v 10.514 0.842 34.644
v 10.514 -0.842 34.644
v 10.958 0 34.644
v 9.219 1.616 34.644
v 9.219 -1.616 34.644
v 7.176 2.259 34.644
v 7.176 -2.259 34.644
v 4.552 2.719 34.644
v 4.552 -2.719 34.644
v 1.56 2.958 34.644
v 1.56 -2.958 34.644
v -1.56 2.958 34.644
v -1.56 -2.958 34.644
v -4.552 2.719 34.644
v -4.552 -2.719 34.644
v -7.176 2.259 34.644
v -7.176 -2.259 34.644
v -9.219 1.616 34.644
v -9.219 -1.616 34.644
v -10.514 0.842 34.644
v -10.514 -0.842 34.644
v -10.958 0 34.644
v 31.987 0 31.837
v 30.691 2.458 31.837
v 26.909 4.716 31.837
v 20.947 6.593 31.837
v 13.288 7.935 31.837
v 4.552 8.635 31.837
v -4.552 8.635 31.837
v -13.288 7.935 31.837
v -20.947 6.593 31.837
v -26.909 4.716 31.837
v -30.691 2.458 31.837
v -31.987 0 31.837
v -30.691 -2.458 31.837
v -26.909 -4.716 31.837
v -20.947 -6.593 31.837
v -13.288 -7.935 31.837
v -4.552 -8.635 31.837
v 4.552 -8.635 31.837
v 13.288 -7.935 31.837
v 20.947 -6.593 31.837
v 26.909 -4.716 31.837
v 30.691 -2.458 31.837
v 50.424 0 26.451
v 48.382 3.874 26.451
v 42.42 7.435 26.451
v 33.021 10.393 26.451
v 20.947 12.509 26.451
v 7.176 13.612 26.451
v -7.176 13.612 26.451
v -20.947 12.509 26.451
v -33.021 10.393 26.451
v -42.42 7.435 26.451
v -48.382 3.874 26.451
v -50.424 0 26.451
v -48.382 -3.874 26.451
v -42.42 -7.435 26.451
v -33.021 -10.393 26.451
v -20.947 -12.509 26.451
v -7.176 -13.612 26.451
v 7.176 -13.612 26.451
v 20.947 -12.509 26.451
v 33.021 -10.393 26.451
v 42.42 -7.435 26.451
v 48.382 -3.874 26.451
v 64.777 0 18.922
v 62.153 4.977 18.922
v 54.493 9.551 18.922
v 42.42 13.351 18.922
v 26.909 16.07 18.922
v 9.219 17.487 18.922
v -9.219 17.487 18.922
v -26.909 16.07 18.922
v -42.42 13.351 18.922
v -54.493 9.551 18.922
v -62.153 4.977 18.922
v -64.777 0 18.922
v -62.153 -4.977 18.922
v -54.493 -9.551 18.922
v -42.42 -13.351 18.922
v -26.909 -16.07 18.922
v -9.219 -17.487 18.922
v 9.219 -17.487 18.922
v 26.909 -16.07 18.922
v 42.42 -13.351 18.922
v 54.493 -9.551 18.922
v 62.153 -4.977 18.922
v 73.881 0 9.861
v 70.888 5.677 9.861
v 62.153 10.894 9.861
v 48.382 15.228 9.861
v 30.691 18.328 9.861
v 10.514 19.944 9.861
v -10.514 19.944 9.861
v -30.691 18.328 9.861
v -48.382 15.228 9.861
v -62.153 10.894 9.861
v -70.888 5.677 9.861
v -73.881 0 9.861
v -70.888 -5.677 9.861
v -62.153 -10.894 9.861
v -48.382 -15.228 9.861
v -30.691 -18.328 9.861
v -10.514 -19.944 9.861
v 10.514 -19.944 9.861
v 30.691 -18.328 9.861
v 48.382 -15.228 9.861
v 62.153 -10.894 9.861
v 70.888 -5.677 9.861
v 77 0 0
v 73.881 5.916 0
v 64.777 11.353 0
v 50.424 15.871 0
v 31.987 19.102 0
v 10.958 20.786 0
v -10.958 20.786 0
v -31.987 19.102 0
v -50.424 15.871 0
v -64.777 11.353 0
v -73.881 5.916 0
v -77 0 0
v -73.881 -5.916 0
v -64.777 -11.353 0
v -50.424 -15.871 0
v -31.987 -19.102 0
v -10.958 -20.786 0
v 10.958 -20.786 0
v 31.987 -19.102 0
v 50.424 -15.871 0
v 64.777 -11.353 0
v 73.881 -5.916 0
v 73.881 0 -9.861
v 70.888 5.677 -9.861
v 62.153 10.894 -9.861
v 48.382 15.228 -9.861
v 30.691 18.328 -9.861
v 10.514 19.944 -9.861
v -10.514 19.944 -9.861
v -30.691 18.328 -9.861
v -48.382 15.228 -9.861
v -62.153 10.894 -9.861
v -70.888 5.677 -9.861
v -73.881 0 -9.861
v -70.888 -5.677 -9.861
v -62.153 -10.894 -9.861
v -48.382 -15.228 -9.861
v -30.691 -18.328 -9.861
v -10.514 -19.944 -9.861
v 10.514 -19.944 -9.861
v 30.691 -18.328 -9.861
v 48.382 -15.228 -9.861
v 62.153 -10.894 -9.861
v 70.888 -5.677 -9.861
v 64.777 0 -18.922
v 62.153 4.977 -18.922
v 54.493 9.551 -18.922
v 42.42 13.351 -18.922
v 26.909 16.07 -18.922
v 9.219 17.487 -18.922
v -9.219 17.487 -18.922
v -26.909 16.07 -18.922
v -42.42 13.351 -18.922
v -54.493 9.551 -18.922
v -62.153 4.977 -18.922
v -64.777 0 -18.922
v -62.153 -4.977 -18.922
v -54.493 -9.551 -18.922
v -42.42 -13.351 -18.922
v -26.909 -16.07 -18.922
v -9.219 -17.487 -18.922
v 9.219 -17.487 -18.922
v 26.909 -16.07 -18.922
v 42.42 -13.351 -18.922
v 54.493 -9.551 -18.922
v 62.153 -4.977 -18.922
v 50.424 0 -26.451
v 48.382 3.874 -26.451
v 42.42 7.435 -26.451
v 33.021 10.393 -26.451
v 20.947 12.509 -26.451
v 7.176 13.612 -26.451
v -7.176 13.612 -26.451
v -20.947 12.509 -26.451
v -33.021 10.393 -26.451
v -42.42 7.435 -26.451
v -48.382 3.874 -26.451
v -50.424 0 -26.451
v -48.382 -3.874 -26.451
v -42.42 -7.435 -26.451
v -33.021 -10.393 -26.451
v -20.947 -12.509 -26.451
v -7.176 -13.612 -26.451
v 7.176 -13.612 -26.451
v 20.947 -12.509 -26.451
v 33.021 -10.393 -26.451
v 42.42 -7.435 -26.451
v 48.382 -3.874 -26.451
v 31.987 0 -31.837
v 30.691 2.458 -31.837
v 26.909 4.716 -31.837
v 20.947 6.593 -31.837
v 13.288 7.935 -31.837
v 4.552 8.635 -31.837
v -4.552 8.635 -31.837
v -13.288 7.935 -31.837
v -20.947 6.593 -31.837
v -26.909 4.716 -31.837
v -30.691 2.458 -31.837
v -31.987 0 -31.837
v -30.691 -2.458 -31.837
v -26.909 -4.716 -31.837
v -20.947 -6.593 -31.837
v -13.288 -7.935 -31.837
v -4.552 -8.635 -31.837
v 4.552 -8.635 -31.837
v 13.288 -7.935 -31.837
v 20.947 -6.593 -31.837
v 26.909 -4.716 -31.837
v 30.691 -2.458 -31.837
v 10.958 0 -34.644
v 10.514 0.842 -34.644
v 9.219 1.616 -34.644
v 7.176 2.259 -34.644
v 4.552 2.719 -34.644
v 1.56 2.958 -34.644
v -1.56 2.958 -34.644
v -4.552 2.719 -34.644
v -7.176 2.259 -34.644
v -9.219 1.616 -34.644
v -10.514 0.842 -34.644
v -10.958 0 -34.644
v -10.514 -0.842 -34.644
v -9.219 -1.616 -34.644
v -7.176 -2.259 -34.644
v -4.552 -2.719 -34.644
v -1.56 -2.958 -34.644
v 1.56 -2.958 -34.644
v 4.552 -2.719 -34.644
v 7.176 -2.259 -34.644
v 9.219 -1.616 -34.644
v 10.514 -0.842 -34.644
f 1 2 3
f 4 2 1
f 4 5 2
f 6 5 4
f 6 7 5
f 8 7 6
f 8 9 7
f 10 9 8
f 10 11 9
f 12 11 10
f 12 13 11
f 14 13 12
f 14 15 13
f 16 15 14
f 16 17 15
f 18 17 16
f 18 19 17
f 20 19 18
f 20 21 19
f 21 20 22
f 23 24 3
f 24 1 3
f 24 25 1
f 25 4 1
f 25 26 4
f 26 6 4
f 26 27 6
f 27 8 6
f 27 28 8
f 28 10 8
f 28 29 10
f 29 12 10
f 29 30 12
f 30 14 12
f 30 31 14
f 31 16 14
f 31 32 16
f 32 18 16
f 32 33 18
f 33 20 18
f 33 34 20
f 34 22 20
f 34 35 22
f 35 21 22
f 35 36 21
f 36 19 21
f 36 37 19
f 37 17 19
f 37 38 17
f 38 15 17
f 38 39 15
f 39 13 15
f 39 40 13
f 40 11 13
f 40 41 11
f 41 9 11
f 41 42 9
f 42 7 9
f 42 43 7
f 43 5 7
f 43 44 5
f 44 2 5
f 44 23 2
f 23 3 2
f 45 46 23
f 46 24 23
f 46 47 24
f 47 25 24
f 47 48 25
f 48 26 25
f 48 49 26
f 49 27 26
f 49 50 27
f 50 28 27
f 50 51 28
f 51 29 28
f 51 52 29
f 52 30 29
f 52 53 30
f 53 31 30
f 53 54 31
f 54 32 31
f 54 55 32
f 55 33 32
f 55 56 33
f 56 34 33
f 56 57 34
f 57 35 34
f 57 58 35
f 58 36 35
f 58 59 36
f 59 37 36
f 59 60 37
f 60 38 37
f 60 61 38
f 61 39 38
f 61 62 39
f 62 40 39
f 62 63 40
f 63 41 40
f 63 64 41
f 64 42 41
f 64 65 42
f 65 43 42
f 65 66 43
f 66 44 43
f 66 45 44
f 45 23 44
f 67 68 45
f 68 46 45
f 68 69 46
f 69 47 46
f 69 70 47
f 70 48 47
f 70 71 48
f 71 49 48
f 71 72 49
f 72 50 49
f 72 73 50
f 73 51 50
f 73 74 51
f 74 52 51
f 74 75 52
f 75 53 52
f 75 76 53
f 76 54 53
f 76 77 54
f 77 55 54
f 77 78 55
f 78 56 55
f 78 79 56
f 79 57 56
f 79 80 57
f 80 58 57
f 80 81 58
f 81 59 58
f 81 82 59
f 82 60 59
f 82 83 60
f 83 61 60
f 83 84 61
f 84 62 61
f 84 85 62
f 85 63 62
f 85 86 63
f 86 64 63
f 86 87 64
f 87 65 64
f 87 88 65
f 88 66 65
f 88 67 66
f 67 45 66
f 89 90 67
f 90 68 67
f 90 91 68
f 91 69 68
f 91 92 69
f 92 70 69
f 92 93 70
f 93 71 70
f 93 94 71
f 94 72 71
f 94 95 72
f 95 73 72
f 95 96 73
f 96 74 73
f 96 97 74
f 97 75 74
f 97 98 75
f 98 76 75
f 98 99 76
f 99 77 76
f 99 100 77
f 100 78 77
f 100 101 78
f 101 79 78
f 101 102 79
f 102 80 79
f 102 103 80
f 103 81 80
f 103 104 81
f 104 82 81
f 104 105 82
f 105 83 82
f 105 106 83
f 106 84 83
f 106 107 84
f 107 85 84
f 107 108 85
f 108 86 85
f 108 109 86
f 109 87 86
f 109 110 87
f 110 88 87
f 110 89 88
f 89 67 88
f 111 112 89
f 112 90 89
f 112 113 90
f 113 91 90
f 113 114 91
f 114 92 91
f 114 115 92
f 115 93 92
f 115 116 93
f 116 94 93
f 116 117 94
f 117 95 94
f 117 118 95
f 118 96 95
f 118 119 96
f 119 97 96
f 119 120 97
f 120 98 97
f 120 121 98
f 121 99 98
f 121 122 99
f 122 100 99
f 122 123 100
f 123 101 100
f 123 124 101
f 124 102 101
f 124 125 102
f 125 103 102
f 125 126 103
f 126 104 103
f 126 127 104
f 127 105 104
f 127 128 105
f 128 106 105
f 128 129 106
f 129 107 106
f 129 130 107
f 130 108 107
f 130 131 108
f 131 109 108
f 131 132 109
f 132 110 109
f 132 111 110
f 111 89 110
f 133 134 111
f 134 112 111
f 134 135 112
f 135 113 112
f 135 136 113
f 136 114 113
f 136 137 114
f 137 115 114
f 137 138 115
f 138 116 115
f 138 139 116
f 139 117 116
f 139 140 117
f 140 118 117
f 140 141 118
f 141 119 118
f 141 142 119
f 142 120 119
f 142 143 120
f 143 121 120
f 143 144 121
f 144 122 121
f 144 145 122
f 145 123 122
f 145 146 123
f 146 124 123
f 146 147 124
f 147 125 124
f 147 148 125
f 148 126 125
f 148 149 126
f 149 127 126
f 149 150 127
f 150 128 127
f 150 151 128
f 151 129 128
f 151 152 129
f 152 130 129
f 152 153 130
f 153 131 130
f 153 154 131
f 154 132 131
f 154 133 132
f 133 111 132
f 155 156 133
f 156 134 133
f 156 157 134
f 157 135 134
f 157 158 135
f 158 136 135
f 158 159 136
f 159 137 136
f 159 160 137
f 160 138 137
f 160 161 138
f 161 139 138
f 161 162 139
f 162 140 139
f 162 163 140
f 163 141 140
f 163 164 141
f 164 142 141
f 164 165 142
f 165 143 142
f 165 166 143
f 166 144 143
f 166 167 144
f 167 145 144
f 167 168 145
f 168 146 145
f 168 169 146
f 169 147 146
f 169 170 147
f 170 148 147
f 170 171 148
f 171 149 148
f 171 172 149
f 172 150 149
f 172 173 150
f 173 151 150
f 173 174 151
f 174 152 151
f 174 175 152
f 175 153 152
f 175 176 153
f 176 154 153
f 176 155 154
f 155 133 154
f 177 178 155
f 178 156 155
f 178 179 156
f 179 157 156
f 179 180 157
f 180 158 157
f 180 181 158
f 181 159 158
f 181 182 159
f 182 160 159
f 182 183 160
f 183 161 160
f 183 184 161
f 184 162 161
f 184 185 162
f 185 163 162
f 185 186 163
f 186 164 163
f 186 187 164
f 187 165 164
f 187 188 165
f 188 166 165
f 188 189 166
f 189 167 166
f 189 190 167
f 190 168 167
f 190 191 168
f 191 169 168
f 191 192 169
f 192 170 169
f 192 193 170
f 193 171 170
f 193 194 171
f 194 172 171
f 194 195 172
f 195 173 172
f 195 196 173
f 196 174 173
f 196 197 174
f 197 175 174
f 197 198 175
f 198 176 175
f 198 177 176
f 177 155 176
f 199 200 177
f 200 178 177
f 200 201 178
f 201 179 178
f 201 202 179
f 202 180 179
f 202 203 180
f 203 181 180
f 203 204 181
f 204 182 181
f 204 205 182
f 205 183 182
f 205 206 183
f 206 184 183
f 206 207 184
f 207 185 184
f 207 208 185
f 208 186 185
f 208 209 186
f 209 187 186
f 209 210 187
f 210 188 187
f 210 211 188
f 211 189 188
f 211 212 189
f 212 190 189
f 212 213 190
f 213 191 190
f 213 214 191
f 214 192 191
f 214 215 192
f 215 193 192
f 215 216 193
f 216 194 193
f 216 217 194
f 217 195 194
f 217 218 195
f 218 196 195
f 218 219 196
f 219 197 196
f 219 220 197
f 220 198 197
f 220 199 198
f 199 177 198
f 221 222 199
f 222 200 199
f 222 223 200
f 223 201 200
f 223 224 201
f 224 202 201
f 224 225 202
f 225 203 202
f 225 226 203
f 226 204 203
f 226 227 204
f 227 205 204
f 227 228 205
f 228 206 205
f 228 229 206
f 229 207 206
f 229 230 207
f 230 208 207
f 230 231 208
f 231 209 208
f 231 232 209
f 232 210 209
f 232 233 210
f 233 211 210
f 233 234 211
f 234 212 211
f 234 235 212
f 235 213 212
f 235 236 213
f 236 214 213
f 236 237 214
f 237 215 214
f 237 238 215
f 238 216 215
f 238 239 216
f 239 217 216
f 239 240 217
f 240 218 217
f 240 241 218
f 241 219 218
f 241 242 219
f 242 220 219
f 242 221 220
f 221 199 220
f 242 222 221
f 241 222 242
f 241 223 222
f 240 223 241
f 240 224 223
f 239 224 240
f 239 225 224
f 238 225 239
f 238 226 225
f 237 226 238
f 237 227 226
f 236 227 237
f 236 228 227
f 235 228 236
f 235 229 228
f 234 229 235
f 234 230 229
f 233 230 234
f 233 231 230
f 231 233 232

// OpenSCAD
// Generated by SolidPython 1.0.1 on 2020-07-29 00:46:49


scale(v = [11, 3, 5]) {
	sphere(r = 7);
}
/***********************************************
*********      SolidPython code:      **********
************************************************
 
# import packages: SolidPython
from solid import *
from solid.utils import *
from itertools import chain, combinations, permutations


class Resize:

    def __init__(self, scad_file):
        self.scad_file = scad_file
        #self.scad_file = import_scad(scad_file)
        # cone/cylinder param:
        self.r1 = 0
        self.r2 = 0
        self.h = 0
        # rectangular prism param:
        self.w = 0
        self.l = 0
        # ellipse param:
        self.r = 0

    # import OpenScad code (file name corresponds to shape)


    # classify shape + parameters
    def assign(self, param1, param2, param3):
        if self.scad_file == 'cone.scad':
            self.r1 = param1
            self.r2 = param2
            self.h = param3
        elif self.scad_file == 'cylinder.scad':
            self.r1 = param1
            self.r2 = param2
            self.h = param3
        elif self.scad_file == 'rectangularPrism.scad':
            self.h = param1
            self.l = param2
            self.w = param3
        else:
            self.r = param1
            self.h = param2

    # resize parameters
    def iterate(self):
        x = range(3, 20, 2)
        i = 1
        if self.scad_file == 'cone.scad':
            tempList = list(permutations(x, 2))
            for temp in tempList:
                param1 = temp[0]
                param2 = temp[1]
                filepath = 'produced_scad_files/' + 'cone' + str(param1) + '_' + str(param2) + '_' + '.scad'
                scad_render_to_file(cylinder(h=param1, r1=param2, r2=0), filepath)

        elif self.scad_file == 'cylinder.scad':
            tempList = list(permutations(x, 3))
            for temp in tempList:
                param1 = temp[0]
                param2 = temp[1]
                filepath = 'produced_scad_files/' + 'cylinder' + str(param1) + '_' + str(param2) + '_' + '.scad'
                scad_render_to_file(cylinder(h=param1, r1=param2, r2=param2), filepath)

        elif self.scad_file == 'rectangularPrism.scad':
            tempList = list(permutations(x, 3))
            for temp in tempList:
                param1 = temp[0]
                param2 = temp[1]
                param3 = temp[2]
                filepath = 'produced_scad_files/' + 'rectangularPrism' + str(param1) + '_' + str(param2) + '_' + str(
                    param3) + '.scad'
                scad_render_to_file(cube(size=(param1, param2, param3)), filepath)

        elif self.scad_file == 'ellipse.scad':
            tempList = list(permutations(x, 4))
            for temp in tempList:
                param1 = temp[0]
                param2 = temp[1]
                param3 = temp[2]
                param4 = temp[3]
                filepath = 'produced_scad_files/' + 'ellipse' + str(param1) + '_' + str(param2) + '_' + str(param3) + '_' + str(param4) + '.scad'
                scad_render_to_file(scale([param1, param2, param3])(sphere(r=param4)), filepath)

    def render_to_scadfile(self):
        scad_render_to_file(scad, 'example.scad') 
 
************************************************/
